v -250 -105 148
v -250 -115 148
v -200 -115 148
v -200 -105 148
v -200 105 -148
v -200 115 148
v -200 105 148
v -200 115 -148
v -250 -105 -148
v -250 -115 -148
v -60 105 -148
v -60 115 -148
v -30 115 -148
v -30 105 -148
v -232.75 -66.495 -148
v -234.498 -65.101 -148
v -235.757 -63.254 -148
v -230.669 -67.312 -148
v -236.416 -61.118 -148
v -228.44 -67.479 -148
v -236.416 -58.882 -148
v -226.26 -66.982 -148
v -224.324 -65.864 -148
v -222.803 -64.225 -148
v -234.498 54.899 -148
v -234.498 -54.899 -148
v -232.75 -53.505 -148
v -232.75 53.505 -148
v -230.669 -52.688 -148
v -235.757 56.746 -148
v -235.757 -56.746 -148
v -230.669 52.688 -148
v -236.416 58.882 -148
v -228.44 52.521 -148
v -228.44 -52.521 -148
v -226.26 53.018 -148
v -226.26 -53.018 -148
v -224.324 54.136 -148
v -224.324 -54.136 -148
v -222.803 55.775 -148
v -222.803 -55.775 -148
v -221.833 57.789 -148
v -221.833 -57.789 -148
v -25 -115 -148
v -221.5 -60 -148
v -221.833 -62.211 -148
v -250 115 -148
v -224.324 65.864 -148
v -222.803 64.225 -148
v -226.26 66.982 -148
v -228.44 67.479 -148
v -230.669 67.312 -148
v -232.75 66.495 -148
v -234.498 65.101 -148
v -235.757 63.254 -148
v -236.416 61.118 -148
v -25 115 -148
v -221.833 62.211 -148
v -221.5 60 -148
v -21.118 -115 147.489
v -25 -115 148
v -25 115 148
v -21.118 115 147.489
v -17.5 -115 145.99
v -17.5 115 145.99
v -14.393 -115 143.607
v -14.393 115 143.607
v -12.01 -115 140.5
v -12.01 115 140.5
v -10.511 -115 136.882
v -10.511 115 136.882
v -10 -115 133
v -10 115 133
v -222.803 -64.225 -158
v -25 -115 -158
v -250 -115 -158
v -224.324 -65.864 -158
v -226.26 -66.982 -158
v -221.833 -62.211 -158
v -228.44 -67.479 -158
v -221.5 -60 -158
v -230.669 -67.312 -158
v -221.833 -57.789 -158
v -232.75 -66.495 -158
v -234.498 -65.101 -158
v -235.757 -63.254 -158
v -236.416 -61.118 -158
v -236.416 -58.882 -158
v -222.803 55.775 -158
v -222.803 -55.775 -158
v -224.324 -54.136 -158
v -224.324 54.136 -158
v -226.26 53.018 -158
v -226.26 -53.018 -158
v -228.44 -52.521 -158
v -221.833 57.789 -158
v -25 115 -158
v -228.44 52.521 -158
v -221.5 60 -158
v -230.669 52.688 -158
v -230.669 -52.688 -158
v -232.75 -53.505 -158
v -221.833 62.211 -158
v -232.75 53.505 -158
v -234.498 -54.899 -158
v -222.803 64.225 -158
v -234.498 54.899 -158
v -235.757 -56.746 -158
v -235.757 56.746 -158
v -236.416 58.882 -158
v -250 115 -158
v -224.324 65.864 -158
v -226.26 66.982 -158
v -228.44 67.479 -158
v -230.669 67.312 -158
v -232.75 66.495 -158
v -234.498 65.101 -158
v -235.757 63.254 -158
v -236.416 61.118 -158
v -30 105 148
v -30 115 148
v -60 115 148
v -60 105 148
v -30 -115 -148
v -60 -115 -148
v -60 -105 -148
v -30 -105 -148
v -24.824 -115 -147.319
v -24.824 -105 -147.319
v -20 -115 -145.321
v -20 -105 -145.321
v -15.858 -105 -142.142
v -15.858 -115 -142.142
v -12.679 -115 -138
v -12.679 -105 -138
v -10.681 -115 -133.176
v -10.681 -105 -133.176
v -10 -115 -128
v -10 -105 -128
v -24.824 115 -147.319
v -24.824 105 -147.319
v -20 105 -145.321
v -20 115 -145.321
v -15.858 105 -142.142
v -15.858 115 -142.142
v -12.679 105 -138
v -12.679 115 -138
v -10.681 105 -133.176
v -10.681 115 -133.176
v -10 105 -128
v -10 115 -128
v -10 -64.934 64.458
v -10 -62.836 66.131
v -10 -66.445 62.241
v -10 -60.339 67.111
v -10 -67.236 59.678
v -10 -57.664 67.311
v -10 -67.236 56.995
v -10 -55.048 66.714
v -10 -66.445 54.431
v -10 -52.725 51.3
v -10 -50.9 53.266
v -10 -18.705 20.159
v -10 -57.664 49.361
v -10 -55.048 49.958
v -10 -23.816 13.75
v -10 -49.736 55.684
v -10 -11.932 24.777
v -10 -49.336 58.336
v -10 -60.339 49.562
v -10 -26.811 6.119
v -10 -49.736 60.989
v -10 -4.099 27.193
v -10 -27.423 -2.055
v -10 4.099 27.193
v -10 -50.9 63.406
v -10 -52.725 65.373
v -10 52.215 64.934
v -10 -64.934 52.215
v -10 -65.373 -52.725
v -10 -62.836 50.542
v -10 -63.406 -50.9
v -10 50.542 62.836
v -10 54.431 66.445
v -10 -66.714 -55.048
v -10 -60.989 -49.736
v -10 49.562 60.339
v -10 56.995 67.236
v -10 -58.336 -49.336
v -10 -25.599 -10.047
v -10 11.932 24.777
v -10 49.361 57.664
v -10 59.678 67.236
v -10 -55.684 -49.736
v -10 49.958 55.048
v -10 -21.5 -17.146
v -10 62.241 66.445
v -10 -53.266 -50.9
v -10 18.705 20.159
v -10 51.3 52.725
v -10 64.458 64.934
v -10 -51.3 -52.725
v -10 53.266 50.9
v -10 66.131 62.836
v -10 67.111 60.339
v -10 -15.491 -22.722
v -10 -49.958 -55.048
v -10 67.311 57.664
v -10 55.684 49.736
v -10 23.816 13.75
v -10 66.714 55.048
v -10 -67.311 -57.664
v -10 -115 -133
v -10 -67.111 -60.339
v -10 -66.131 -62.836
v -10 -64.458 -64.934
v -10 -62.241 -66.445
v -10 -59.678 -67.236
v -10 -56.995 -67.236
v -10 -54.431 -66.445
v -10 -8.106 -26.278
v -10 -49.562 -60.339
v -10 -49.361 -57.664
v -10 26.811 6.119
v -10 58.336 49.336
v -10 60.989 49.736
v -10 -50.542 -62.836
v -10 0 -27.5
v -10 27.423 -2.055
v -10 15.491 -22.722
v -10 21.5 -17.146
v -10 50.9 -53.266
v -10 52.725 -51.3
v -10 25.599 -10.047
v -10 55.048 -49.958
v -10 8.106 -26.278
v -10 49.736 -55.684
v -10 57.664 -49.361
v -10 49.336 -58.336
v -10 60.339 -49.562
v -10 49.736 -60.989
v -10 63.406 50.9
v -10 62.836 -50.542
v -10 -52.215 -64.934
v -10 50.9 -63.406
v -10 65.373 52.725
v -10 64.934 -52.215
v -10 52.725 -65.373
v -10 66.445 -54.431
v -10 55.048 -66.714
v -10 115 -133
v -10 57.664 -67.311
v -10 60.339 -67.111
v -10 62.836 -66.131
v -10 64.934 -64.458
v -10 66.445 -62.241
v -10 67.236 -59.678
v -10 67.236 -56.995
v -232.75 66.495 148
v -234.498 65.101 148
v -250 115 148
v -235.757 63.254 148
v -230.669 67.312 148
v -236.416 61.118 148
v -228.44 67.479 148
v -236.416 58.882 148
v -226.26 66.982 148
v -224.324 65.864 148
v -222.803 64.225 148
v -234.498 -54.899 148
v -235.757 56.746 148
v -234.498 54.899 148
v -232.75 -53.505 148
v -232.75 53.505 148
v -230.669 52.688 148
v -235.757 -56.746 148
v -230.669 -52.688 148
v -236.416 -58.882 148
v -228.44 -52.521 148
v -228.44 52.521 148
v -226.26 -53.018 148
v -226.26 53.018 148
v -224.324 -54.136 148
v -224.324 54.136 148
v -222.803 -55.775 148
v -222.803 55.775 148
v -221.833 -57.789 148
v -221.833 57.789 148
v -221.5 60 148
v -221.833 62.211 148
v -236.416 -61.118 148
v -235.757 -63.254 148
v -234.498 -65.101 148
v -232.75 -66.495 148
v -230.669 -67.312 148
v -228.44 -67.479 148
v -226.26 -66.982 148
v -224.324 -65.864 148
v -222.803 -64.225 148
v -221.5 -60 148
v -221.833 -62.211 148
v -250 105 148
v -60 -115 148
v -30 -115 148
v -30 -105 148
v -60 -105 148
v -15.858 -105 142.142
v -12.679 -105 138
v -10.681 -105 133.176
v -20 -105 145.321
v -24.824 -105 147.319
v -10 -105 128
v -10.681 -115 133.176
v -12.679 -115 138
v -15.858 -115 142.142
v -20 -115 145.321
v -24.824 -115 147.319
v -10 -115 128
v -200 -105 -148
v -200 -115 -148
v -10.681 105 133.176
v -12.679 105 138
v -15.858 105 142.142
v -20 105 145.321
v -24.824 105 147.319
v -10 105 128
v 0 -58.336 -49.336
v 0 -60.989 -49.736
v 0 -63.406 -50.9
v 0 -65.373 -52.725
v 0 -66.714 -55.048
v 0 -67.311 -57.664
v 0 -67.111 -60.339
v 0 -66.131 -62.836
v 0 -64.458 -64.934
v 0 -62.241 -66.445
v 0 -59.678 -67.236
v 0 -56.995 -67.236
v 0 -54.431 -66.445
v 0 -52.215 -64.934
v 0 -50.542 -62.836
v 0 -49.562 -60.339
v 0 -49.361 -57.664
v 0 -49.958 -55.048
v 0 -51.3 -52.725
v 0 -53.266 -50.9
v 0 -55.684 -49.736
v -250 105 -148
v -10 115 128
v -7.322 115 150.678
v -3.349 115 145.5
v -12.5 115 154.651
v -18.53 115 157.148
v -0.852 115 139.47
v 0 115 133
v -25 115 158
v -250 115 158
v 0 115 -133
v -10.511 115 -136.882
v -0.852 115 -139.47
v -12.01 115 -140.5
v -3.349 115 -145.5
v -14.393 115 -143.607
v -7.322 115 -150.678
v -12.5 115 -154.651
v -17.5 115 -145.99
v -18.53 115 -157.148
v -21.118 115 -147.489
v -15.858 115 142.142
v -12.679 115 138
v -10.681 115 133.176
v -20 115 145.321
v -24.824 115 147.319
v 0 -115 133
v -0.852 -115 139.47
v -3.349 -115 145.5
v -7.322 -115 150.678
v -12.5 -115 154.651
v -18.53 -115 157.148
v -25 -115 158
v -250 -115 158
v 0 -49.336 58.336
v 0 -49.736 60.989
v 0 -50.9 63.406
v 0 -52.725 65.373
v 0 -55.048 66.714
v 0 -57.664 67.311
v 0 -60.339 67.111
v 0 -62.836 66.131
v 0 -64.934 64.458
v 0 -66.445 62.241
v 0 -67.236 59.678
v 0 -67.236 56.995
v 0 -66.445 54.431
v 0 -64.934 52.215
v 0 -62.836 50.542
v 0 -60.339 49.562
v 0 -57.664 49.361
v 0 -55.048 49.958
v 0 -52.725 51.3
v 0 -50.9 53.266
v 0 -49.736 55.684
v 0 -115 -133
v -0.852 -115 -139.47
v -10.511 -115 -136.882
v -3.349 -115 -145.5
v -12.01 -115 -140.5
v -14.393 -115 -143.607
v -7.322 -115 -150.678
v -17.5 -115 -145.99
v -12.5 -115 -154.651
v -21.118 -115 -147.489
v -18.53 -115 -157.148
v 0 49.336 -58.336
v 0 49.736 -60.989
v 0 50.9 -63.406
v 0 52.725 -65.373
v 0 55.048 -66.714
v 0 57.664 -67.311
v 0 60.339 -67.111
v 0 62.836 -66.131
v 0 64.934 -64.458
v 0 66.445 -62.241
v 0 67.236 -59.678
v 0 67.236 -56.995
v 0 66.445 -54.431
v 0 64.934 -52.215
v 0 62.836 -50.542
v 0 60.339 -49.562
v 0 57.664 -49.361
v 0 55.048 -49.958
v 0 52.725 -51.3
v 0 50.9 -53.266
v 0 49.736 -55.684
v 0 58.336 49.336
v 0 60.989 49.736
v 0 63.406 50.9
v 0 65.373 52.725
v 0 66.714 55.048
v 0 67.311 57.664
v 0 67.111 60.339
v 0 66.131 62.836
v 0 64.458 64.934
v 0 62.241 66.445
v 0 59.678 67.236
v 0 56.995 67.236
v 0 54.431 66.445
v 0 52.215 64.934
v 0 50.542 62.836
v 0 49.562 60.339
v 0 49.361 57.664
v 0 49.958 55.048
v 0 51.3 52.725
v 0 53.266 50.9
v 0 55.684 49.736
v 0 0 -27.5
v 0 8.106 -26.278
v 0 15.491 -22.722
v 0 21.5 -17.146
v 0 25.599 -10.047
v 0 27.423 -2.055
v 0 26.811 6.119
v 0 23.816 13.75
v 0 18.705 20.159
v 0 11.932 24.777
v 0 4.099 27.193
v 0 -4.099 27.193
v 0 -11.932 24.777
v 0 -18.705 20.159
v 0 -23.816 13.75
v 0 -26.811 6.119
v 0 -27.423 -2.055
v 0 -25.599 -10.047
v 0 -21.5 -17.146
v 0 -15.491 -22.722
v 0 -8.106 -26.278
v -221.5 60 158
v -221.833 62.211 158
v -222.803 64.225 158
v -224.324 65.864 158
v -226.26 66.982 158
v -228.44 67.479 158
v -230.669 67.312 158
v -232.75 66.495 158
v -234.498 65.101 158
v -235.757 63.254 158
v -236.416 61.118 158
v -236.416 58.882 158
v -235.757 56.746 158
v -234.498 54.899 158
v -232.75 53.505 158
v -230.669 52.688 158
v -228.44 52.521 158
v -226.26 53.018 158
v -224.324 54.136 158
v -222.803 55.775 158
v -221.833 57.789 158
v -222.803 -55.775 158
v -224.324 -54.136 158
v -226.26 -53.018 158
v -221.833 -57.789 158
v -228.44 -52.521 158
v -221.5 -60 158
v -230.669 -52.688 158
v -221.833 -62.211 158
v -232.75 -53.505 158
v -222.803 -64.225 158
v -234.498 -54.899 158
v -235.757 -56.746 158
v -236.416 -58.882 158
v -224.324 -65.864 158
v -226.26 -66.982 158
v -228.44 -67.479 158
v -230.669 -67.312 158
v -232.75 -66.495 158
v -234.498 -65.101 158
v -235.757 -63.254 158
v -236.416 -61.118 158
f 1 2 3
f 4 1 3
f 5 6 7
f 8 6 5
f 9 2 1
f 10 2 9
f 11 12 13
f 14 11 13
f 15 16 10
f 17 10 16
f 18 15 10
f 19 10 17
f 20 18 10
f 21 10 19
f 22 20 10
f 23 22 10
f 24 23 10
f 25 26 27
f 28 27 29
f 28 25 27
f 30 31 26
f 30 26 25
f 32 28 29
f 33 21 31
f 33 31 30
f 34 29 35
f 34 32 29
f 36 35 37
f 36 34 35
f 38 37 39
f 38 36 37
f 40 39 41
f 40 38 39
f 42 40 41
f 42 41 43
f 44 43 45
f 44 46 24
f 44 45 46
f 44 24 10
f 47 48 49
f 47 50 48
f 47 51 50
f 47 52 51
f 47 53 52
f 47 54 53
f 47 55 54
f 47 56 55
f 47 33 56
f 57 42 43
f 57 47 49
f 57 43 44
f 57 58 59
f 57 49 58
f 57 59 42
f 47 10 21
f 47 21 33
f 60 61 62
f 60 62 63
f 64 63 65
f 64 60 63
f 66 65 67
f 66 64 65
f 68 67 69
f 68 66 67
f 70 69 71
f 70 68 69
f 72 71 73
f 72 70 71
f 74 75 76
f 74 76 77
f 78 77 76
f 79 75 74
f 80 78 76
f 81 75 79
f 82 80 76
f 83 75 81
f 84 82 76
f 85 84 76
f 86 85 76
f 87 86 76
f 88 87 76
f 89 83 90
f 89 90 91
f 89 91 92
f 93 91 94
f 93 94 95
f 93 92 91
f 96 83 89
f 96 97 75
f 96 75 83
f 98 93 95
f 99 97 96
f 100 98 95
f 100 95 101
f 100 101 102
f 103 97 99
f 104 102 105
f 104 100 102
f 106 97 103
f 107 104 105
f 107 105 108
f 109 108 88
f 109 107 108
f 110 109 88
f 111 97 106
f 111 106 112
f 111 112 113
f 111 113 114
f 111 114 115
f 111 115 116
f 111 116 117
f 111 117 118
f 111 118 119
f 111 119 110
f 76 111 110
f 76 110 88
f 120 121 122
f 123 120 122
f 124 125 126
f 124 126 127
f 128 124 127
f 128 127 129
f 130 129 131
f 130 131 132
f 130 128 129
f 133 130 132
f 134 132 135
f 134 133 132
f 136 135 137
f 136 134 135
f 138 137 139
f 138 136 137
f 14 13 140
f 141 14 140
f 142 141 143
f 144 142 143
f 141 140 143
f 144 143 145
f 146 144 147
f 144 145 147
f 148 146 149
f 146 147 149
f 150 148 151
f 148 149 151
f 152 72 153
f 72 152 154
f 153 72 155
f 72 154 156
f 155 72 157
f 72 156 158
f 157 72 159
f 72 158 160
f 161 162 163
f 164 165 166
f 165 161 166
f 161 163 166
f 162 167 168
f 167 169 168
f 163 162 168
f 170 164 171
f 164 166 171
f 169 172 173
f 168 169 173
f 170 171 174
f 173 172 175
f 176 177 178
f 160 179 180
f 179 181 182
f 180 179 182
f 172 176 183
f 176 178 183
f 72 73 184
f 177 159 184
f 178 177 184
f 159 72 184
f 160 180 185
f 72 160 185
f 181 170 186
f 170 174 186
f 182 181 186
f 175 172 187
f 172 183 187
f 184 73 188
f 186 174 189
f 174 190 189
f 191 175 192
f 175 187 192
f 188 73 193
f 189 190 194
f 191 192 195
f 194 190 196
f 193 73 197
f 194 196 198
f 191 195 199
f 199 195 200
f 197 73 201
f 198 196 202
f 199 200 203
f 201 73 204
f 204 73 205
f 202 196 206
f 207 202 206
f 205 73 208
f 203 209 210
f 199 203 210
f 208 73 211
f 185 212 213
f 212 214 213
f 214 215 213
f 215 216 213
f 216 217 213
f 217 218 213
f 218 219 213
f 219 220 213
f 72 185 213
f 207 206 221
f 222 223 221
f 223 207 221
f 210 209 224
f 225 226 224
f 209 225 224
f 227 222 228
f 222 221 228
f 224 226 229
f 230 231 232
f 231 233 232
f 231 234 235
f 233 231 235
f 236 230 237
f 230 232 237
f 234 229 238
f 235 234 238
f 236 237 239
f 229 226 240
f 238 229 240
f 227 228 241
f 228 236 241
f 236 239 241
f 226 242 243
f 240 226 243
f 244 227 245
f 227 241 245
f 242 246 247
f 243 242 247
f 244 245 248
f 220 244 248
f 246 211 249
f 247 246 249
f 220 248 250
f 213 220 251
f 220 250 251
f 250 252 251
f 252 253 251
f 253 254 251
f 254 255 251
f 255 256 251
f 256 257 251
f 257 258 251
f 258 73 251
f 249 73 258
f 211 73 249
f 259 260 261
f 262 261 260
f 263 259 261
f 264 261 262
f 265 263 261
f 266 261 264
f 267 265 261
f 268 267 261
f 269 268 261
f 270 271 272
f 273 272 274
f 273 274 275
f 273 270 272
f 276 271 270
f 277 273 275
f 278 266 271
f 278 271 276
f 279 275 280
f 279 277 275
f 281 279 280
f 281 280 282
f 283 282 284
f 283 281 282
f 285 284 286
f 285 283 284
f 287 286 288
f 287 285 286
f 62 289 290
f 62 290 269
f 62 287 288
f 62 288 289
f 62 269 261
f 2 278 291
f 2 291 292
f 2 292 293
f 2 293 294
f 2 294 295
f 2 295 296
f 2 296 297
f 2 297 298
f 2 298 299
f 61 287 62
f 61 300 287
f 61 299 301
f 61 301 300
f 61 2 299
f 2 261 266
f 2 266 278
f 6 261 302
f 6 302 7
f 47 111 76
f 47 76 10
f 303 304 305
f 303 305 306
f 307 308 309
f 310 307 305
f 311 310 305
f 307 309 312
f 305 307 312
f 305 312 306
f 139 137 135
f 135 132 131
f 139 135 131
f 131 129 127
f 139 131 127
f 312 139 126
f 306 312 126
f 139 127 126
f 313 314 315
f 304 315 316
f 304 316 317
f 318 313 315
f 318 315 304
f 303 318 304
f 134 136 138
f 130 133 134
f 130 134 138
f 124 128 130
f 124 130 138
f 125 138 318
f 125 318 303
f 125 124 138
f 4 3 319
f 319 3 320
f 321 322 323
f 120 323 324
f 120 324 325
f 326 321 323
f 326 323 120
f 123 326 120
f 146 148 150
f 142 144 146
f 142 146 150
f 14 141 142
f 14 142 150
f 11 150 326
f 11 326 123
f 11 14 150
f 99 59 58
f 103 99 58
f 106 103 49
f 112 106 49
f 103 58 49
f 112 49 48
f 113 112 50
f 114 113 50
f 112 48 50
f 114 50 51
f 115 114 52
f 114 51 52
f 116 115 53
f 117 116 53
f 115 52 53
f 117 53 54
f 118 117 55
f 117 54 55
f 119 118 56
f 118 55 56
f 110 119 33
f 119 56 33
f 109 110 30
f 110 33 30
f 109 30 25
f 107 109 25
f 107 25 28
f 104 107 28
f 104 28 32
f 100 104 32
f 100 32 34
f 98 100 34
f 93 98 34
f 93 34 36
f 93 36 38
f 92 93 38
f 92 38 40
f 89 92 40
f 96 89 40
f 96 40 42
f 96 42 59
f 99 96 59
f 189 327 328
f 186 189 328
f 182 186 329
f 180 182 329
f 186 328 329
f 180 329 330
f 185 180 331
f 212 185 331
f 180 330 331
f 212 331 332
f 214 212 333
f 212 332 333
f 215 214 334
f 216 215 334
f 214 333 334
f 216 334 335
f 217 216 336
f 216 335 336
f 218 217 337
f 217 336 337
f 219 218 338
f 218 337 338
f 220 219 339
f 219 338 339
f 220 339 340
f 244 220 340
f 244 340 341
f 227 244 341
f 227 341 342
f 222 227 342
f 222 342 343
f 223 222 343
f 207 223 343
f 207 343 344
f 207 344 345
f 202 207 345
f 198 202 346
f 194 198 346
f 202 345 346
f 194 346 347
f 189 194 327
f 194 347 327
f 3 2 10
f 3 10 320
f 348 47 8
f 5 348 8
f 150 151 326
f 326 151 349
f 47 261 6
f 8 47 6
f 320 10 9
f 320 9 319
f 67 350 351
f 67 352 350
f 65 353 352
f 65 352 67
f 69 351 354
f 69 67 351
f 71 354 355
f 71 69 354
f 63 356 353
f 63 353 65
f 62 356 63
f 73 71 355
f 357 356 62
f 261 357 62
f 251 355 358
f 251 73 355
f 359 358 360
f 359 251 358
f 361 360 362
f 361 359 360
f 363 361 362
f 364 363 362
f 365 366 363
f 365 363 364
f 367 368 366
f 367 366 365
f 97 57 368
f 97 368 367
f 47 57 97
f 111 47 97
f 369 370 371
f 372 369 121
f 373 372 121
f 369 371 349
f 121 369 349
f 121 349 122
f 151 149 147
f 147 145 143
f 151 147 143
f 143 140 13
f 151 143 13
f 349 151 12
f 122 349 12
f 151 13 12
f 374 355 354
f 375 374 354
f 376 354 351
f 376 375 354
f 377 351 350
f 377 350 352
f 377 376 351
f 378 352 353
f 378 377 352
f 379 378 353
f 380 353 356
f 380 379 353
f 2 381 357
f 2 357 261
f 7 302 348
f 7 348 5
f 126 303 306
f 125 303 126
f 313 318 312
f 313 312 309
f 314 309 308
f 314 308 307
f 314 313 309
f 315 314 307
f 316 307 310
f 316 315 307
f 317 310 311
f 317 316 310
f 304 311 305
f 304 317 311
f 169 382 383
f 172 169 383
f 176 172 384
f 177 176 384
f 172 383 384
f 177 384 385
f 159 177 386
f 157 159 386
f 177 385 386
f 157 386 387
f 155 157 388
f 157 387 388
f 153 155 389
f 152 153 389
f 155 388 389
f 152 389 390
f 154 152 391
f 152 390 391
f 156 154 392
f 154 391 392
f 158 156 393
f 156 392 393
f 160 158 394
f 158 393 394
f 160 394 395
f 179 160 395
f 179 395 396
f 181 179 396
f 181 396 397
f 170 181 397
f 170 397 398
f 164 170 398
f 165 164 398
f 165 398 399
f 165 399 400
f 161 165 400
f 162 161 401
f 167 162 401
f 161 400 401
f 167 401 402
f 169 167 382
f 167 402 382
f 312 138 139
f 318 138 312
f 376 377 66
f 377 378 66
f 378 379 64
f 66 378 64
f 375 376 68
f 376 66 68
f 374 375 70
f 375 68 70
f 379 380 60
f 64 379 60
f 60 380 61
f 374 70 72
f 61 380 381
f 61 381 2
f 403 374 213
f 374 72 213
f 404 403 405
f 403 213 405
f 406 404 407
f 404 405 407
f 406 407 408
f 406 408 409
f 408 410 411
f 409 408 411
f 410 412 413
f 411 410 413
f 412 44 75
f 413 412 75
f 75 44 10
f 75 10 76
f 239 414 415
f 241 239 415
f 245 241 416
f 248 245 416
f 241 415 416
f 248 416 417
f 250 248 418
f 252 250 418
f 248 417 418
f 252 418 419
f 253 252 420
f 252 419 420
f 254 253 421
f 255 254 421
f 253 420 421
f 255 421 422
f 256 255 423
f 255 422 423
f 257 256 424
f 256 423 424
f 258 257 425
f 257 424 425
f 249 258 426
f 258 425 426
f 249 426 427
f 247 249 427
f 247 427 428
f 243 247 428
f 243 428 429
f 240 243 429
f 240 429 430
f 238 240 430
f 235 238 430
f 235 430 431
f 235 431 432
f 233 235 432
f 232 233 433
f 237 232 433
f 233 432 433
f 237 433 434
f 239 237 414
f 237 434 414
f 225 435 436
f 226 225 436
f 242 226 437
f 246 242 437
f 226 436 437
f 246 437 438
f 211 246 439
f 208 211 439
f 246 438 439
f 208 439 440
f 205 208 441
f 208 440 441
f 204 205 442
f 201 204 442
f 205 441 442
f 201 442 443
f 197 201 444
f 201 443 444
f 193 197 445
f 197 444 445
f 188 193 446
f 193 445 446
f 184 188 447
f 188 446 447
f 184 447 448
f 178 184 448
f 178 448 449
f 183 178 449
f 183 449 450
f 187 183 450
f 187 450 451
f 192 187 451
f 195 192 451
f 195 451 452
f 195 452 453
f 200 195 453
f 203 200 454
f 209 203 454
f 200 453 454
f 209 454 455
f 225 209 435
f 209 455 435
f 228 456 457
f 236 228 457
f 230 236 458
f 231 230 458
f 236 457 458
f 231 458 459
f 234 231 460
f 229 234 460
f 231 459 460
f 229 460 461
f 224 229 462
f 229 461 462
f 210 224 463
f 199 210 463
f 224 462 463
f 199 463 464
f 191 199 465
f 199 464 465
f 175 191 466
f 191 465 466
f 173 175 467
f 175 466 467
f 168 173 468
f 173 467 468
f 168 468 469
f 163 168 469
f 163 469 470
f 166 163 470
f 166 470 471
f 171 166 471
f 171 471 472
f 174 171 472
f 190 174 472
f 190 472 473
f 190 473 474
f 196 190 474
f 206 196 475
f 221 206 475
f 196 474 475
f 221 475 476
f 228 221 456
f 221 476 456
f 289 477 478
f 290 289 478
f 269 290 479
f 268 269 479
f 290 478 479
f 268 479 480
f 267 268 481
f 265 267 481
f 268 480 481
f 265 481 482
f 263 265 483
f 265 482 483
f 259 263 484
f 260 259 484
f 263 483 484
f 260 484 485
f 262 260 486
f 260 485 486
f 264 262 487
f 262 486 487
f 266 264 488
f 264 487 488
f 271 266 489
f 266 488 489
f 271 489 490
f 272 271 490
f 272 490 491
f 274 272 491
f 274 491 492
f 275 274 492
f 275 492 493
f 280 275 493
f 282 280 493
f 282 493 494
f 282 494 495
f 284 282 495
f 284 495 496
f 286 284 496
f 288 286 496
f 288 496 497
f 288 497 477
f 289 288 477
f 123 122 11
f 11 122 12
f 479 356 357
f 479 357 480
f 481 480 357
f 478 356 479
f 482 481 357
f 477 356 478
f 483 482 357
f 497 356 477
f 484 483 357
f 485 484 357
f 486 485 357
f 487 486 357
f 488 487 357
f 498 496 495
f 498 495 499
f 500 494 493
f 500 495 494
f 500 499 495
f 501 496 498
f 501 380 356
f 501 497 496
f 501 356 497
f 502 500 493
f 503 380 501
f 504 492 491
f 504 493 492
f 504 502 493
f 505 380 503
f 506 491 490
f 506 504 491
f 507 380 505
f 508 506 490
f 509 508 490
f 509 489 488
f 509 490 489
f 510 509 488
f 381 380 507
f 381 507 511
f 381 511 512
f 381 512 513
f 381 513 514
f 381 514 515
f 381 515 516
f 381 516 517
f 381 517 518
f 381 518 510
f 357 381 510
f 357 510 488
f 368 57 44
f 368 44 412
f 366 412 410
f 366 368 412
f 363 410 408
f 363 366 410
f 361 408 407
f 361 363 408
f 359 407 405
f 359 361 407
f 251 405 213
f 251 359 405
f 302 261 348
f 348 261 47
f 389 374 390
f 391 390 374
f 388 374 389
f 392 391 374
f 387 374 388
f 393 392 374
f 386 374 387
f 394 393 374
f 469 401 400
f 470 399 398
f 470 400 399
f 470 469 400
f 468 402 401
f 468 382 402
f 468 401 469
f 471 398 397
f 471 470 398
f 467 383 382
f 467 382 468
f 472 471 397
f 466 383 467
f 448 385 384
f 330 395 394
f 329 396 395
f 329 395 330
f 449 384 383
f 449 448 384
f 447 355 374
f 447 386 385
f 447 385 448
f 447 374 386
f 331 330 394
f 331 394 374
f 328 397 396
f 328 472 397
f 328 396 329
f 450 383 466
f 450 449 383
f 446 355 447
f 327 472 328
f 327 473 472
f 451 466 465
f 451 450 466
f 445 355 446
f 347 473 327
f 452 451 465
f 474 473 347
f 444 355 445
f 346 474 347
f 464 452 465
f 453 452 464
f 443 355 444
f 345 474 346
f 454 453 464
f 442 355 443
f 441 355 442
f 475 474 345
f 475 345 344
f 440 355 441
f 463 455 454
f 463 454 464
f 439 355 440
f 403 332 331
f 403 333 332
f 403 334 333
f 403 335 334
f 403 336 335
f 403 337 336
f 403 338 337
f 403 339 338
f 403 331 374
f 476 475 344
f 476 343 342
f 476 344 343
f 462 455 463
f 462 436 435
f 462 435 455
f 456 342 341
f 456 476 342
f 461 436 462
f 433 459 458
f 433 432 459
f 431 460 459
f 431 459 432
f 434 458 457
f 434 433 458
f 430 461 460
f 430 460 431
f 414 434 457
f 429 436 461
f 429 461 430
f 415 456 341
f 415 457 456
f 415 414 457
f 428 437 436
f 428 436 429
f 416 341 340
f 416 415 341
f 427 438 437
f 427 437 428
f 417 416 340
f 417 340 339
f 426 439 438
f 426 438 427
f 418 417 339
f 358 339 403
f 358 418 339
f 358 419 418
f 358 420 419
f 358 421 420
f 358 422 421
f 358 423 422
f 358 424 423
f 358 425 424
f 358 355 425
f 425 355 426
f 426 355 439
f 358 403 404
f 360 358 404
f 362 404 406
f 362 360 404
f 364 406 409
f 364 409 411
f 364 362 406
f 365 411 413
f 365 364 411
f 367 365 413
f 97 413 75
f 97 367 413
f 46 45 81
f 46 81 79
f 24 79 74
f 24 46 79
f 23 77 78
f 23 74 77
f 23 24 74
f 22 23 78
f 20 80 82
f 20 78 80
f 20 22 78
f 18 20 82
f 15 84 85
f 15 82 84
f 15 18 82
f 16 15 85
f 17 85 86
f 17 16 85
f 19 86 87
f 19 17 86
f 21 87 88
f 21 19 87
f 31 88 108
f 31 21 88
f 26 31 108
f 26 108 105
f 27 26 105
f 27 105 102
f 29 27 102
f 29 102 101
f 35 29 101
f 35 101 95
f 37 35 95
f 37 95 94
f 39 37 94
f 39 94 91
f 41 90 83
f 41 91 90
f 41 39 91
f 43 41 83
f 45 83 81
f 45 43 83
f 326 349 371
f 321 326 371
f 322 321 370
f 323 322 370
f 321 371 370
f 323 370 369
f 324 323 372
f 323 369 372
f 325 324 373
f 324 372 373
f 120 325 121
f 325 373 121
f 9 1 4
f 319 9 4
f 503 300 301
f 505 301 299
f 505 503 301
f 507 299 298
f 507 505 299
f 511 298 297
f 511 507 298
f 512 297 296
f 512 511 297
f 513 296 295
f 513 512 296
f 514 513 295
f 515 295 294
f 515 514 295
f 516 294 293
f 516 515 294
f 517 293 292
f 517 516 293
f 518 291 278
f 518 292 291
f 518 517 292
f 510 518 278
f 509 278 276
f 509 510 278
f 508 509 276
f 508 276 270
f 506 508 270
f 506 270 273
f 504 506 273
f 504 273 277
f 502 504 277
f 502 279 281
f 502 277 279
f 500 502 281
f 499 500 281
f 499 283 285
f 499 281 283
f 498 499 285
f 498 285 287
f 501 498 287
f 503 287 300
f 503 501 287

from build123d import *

# Parameters (mm, degrees)
SKETCH1_W                      = 316
SKETCH1_H                      = 230
BASE_FLANGE1_DEPTH             = 10
EDGE_FLANGE1_STRIP_W           = 70
EDGE_FLANGE1_STRIP_H           = 10
EDGE_FLANGE1_STRIP_CUT_DEPTH   = 230
EDGE_FLANGE1_STRIP_2_W         = 70
EDGE_FLANGE1_STRIP_2_H         = 10
EDGE_FLANGE1_STRIP_CUT_2_DEPTH = 230
EDGE_FLANGE1_DEPTH             = 230
EDGE_FLANGE1_BEND_DEPTH        = 230
SKETCH12_R                     = 27.5
CUT_EXTRUDE1_DEPTH             = 10
SKETCH13_R                     = 7.5
CUT_EXTRUDE2_DEPTH             = 420.023865669
SKETCH14_R                     = 9
CUT_EXTRUDE3_DEPTH             = 10
BOSS_EXTRUDE1_DEPTH            = 10
SKETCH15_W                     = 50
SKETCH15_H                     = 296
BOSS_EXTRUDE1_2_DEPTH          = 10
CIRPATTERN1_COUNT              = 4


# Sheet-metal steps are written as plain solids
with BuildPart() as part:
    # Sketch1 → Base-Flange1 (new body)
    with BuildSketch(Plane(origin=(0, 0, 0), x_dir=(0, 0, -1), z_dir=(1, 0, 0))):
        Rectangle(SKETCH1_W, SKETCH1_H)
    extrude(amount=-BASE_FLANGE1_DEPTH)

    # Edge-Flange1 strip (across the edge) → Edge-Flange1 strip cut (cut)
    with BuildSketch(Plane(origin=(-10, -115, 158), x_dir=(0, 0, -1), z_dir=(0, 1, 0))):
        with Locations((-10, -5)):
            Rectangle(EDGE_FLANGE1_STRIP_W, EDGE_FLANGE1_STRIP_H)
    extrude(amount=EDGE_FLANGE1_STRIP_CUT_DEPTH, mode=Mode.SUBTRACT)

    # Edge-Flange1 strip 2 (across the edge) → Edge-Flange1 strip cut 2 (cut)
    with BuildSketch(Plane(origin=(-10, 115, -158), x_dir=(0, 0, 1), z_dir=(0, -1, 0))):
        with Locations((-10, -5)):
            Rectangle(EDGE_FLANGE1_STRIP_2_W, EDGE_FLANGE1_STRIP_2_H)
    extrude(amount=EDGE_FLANGE1_STRIP_CUT_2_DEPTH, mode=Mode.SUBTRACT)

    # Edge-Flange1 section (across the edge) → Edge-Flange1 (add)
    with BuildSketch(Plane(origin=(-10, -115, 158), x_dir=(0, 0, -1), z_dir=(0, 1, 0))):
        with BuildLine():
            Line((0, 15), (0, 240))
            Line((0, 240), (10, 240))
            Line((10, 240), (10, 15))
            ThreePointArc((10, 15), (14.393398282, 4.393398282), (25, 0))
            Line((25, 0), (25, -10))
            ThreePointArc((25, -10), (7.32233047, -2.67766953), (0, 15))
        make_face()
    extrude(amount=EDGE_FLANGE1_DEPTH)

    # Edge-Flange1 section 2 (across the edge) → Edge-Flange1 bend (add)
    with BuildSketch(Plane(origin=(-10, 115, -158), x_dir=(0, 0, 1), z_dir=(0, -1, 0))):
        with BuildLine():
            Line((0, 15), (0, 240))
            Line((0, 240), (10, 240))
            Line((10, 240), (10, 15))
            ThreePointArc((10, 15), (14.393398282, 4.393398282), (25, 0))
            Line((25, 0), (25, -10))
            ThreePointArc((25, -10), (7.32233047, -2.67766953), (0, 15))
        make_face()
    extrude(amount=EDGE_FLANGE1_BEND_DEPTH)

    # Sketch12 → Cut-Extrude1 (cut)
    with BuildSketch(Plane(origin=(0, 0, 0), x_dir=(0, 0, -1), z_dir=(1, 0, 0))):
        Circle(SKETCH12_R)
    extrude(amount=-CUT_EXTRUDE1_DEPTH, mode=Mode.SUBTRACT)

    # Sketch13 → Cut-Extrude2 (cut, through all)
    with BuildSketch(Plane.XY.offset(158)):
        with Locations((-229, 60)):
            Circle(SKETCH13_R)
    cut_extrude2 = extrude(amount=-CUT_EXTRUDE2_DEPTH, mode=Mode.SUBTRACT)

    # Sketch14 → Cut-Extrude3 (cut)
    with BuildSketch(Plane(origin=(0, 0, 0), x_dir=(0, 0, -1), z_dir=(1, 0, 0))):
        with Locations((-58.336309448, 58.336309448)):
            Circle(SKETCH14_R)
    cut_extrude3 = extrude(amount=-CUT_EXTRUDE3_DEPTH, mode=Mode.SUBTRACT)

    # Mirror1: Cut-Extrude2 across plane
    add(cut_extrude2.mirror(Plane.ZX), mode=Mode.SUBTRACT)

    # CirPattern1: Cut-Extrude3 ×4 about axis
    cirpattern1_axis = Axis((0, 0, 0), (1, 0, 0))
    for i in range(1, CIRPATTERN1_COUNT):
        add(cut_extrude3.rotate(cirpattern1_axis, i * 360 / CIRPATTERN1_COUNT), mode=Mode.SUBTRACT)


with BuildPart() as body_2:
    # Sketch15 → Boss-Extrude1 (new body)
    with BuildSketch(Plane(origin=(0, 115, 0), x_dir=(1, 0, 0), z_dir=(0, 1, 0))):
        with BuildLine():
            Line((-60, 148), (-30, 148))
            ThreePointArc((-30, 148), (-15.857864376, 142.142135624), (-10, 128))
            Line((-10, 128), (-10, -128))
            ThreePointArc((-10, -128), (-15.857864376, -142.142135624), (-30, -148))
            Line((-30, -148), (-60, -148))
            Line((-60, -148), (-60, 148))
        make_face()
    extrude(amount=-BOSS_EXTRUDE1_DEPTH)


with BuildPart() as body_3:
    # Sketch15 → Boss-Extrude1 2 (new body)
    with BuildSketch(Plane(origin=(0, 115, 0), x_dir=(1, 0, 0), z_dir=(0, 1, 0))):
        with Locations((-225, 0)):
            Rectangle(SKETCH15_W, SKETCH15_H)
    extrude(amount=-BOSS_EXTRUDE1_2_DEPTH)


with BuildPart() as body_4:
    # Mirror2: mirrored copy
    add(body_2.part.mirror(Plane.ZX))


with BuildPart() as body_5:
    # Mirror2 2: mirrored copy
    add(body_3.part.mirror(Plane.ZX))


solid = Compound([part.part, body_2.part, body_3.part, body_4.part, body_5.part])
